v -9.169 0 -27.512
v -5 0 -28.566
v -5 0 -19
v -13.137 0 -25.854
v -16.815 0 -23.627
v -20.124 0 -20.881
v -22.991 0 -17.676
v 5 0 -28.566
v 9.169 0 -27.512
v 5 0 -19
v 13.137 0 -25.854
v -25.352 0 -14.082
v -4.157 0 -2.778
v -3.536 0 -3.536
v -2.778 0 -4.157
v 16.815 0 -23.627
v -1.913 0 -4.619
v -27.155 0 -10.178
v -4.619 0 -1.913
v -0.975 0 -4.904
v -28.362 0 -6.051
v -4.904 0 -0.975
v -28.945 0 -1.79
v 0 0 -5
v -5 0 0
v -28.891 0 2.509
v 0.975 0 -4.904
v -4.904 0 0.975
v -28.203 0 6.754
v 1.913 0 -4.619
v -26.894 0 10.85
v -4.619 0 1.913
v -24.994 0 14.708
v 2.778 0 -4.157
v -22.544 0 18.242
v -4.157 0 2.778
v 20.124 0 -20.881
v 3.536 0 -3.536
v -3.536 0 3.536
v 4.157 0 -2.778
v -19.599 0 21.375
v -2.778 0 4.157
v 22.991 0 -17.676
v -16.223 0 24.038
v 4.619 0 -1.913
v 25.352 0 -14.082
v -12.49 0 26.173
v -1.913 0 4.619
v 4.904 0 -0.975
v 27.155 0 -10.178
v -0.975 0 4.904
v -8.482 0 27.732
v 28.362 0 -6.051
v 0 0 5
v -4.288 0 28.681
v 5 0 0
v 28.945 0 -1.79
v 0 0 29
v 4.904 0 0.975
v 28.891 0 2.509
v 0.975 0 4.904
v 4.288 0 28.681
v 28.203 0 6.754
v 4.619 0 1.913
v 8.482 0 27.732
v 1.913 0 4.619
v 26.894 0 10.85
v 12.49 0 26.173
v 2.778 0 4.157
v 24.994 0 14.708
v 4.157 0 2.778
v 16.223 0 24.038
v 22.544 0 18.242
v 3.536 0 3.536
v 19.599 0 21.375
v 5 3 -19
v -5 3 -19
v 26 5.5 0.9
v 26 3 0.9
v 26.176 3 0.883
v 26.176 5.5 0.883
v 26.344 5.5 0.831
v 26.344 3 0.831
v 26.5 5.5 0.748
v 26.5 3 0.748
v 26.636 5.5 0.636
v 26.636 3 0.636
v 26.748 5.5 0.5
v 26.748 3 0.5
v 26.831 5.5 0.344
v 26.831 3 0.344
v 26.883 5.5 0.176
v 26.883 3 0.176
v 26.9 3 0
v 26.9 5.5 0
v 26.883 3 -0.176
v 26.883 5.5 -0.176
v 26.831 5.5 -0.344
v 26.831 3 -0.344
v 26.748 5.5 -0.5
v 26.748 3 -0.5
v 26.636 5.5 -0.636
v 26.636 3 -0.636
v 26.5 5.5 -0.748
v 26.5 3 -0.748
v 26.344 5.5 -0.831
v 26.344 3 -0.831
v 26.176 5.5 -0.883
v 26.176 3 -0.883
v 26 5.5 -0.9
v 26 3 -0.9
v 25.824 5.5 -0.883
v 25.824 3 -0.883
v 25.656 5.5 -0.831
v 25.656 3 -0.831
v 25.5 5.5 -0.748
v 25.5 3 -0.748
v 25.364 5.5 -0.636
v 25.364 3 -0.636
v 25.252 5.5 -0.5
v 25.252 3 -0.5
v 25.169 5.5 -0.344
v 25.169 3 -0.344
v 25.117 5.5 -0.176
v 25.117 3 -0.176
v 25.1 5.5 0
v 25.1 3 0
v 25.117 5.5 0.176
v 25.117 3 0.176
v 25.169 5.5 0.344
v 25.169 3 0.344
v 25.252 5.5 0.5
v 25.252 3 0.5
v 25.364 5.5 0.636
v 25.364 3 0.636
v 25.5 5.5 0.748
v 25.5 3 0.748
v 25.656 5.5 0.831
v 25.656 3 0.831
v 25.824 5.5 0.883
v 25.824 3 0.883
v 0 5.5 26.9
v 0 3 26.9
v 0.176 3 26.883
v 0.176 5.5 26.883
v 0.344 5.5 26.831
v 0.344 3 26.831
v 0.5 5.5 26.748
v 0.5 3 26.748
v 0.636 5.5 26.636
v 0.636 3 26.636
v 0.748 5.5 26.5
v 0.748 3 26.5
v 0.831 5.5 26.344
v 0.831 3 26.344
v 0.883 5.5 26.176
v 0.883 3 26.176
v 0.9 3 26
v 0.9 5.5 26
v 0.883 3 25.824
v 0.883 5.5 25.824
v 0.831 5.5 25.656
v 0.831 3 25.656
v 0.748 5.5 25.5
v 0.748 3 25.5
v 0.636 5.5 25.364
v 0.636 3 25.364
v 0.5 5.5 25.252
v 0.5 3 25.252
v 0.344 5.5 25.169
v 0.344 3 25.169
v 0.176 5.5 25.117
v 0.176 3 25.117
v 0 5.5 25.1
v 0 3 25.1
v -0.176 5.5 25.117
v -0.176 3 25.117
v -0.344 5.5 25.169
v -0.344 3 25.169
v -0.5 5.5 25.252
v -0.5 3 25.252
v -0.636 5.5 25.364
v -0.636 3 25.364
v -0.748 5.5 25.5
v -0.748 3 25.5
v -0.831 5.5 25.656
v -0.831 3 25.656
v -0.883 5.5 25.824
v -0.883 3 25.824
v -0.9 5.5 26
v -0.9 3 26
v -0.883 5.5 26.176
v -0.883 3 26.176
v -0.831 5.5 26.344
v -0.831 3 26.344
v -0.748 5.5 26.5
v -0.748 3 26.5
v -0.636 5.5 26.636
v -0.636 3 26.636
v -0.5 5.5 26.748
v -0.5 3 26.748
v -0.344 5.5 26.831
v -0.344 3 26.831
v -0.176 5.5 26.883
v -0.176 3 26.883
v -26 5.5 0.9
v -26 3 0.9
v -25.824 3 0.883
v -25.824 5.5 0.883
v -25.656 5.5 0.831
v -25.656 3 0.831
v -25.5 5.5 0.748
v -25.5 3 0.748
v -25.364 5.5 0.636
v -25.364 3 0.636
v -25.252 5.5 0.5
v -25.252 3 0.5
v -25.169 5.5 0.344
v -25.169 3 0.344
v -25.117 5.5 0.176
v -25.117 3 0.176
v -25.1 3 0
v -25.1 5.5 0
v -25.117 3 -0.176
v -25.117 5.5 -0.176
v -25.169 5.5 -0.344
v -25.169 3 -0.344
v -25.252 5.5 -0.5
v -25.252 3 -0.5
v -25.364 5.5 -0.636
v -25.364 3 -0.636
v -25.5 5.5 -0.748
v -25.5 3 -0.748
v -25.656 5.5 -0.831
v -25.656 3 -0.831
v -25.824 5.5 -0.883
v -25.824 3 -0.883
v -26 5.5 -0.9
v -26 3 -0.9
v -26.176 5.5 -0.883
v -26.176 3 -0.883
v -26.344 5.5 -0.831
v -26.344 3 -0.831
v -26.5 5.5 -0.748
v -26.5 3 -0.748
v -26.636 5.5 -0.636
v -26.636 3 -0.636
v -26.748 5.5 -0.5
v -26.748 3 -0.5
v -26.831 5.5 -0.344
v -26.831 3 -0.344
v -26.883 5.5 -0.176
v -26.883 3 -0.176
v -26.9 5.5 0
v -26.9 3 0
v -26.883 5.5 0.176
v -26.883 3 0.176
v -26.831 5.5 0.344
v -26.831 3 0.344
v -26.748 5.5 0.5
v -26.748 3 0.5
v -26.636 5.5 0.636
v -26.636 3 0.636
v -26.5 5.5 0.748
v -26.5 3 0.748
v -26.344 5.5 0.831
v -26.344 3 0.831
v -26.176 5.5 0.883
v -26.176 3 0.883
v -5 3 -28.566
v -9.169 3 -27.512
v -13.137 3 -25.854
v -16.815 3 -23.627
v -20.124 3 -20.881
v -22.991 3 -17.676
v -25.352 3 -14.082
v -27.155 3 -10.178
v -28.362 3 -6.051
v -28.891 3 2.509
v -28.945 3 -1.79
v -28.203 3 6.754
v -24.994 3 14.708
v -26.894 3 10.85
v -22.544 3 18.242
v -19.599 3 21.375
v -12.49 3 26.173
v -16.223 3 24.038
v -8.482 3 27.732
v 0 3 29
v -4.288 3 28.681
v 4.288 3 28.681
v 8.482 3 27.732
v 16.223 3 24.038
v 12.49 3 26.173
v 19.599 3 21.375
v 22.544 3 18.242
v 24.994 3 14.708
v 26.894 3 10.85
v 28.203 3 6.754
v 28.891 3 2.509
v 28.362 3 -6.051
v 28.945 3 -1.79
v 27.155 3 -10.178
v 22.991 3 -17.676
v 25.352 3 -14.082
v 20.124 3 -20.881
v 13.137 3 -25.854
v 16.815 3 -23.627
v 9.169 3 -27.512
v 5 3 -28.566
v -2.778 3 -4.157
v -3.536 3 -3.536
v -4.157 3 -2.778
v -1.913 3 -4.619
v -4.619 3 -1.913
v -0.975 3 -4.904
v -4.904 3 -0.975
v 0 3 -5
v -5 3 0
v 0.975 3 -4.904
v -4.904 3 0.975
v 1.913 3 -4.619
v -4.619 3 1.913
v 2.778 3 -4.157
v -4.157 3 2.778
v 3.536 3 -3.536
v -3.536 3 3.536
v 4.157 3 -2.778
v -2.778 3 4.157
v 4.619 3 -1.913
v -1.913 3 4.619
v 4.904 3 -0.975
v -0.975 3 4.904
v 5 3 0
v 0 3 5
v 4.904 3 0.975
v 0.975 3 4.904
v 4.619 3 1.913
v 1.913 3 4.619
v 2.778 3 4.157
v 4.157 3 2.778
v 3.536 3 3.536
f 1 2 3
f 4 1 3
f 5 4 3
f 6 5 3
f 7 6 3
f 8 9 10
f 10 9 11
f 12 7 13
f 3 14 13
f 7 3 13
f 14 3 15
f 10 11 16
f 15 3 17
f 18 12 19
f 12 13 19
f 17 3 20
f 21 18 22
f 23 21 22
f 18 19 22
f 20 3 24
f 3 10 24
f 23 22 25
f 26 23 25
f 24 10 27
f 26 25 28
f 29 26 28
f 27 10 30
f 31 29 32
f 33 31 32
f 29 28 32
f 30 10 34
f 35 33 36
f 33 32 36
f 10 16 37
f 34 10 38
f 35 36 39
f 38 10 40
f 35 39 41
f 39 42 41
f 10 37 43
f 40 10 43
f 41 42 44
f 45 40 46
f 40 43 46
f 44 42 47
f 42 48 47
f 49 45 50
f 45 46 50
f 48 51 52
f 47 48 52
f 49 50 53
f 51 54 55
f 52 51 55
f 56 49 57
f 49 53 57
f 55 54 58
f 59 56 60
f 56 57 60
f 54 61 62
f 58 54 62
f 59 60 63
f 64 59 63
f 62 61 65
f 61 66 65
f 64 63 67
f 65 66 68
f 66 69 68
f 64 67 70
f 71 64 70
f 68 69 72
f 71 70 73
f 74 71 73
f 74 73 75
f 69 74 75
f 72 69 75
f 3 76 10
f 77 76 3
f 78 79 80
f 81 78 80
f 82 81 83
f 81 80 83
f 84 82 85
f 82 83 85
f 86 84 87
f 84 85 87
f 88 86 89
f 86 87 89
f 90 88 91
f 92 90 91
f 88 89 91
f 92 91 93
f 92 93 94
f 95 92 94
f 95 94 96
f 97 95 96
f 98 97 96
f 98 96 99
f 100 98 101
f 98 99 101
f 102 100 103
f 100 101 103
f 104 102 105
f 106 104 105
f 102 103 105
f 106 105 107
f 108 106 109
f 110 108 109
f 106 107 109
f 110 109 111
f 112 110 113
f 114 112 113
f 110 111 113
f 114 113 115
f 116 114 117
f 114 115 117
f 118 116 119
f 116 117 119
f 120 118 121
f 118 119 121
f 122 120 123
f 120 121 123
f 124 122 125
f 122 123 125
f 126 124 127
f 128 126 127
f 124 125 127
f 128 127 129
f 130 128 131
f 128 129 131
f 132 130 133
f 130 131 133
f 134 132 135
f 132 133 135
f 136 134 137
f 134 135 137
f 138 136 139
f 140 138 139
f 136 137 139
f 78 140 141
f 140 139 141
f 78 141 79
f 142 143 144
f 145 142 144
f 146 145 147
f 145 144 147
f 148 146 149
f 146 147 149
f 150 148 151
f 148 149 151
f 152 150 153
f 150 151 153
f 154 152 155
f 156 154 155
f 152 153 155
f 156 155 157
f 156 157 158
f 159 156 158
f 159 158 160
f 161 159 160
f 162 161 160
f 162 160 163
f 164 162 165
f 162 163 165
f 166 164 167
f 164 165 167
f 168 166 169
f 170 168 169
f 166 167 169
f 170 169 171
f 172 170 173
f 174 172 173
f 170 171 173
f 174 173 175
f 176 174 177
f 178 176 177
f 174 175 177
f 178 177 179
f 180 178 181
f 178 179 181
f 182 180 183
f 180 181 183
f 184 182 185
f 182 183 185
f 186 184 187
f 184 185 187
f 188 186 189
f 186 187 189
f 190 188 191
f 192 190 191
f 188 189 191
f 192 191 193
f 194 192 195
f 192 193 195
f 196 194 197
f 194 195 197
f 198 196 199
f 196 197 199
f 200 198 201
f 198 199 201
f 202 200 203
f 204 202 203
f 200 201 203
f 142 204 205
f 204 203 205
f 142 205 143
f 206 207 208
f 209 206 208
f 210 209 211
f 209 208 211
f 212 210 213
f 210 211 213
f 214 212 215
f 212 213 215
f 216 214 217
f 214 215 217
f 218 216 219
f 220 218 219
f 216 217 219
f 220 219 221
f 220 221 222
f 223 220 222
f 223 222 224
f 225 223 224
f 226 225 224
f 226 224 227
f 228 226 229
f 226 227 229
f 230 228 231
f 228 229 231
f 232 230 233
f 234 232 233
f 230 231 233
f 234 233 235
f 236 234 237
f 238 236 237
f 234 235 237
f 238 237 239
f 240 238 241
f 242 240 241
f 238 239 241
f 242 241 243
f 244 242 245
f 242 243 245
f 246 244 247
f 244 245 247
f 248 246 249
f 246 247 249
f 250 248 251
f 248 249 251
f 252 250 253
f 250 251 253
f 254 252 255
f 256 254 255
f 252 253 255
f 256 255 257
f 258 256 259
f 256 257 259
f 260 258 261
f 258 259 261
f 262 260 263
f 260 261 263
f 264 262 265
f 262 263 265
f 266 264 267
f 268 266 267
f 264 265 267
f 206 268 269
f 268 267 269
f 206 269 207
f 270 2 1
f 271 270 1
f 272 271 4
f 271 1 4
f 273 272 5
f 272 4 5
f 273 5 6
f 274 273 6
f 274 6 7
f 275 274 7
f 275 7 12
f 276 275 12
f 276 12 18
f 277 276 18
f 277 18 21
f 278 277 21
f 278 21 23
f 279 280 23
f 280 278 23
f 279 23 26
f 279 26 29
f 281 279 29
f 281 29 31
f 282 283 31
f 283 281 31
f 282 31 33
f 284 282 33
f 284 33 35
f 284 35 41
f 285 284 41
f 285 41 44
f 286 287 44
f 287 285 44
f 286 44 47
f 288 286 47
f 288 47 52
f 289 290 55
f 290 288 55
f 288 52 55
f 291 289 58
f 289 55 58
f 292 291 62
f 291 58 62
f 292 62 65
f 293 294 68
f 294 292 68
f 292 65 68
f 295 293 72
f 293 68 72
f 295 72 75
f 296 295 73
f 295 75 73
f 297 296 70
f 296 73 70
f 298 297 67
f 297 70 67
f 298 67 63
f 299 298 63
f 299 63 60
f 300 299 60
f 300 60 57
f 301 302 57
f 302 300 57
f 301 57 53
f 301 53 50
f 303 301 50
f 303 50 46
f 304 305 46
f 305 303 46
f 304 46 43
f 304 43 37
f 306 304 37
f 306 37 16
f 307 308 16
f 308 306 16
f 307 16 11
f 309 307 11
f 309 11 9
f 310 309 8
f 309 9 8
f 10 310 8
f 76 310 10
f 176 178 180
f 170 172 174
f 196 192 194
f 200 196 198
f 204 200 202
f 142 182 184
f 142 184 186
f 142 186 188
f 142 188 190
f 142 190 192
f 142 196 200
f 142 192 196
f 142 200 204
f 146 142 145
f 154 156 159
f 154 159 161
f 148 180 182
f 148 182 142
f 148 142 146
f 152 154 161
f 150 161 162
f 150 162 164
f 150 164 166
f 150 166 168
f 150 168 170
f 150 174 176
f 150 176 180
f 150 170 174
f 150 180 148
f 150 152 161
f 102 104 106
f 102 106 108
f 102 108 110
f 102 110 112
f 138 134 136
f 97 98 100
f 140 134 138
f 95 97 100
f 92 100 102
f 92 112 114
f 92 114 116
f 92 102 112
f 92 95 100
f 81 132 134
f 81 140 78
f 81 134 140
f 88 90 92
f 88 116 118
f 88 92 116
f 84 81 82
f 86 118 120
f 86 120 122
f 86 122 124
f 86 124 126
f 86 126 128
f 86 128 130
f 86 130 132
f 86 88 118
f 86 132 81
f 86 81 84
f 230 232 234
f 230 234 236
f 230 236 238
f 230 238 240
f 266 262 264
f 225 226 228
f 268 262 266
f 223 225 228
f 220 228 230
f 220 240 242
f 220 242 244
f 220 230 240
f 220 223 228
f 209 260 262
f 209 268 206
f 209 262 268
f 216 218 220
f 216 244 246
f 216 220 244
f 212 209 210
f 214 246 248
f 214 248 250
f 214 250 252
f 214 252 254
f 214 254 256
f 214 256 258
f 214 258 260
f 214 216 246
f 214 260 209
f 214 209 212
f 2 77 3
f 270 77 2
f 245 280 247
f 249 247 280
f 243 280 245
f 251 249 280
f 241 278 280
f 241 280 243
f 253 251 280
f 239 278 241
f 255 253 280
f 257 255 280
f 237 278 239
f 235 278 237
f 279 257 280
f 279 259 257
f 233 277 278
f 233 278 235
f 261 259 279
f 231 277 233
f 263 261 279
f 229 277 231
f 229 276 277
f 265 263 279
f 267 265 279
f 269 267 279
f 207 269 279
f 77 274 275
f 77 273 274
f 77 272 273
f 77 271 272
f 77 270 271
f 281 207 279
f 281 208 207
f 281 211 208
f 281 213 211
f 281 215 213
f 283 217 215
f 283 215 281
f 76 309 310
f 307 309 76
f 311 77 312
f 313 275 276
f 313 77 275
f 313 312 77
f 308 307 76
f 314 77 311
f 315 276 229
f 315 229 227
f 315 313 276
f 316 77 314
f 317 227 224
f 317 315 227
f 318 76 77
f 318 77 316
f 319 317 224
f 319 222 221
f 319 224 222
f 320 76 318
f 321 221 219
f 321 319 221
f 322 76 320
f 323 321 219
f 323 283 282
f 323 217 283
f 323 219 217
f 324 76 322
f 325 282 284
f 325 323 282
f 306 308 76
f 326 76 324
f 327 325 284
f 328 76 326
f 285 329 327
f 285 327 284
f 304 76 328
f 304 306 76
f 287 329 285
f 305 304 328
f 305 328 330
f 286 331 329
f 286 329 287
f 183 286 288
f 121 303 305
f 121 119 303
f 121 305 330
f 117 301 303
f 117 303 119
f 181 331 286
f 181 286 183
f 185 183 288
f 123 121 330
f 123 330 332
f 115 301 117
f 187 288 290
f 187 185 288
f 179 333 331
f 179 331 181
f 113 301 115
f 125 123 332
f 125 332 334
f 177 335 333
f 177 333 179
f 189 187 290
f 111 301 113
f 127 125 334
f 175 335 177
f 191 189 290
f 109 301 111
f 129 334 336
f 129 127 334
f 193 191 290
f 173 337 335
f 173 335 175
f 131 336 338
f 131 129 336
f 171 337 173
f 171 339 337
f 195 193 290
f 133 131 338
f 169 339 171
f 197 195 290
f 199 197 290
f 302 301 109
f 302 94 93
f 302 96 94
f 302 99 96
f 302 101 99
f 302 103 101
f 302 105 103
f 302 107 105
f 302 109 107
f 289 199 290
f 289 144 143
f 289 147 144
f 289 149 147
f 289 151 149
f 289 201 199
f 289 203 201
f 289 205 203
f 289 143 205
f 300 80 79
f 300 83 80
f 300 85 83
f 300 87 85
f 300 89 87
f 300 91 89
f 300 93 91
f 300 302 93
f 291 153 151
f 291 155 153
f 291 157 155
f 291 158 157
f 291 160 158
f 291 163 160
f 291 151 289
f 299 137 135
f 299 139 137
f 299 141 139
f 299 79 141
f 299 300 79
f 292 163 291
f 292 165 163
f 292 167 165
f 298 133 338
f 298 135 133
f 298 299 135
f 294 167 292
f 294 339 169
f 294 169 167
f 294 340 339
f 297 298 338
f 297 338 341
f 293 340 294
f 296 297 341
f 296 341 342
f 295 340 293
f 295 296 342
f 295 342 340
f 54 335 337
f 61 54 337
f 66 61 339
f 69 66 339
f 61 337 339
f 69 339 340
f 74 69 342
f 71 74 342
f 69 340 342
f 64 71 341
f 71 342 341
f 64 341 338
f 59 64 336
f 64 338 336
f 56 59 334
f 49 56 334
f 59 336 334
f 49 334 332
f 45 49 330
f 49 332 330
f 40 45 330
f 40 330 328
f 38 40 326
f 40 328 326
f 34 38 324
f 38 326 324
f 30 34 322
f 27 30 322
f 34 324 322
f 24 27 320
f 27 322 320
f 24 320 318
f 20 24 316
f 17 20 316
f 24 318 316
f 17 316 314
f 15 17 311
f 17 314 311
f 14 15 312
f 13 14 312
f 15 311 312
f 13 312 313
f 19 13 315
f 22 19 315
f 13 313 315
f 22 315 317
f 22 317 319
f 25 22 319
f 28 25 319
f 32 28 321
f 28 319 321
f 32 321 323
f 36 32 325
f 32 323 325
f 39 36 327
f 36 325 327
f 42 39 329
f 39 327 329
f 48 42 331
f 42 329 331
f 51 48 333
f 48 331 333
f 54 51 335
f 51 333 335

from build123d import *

# Parameters (mm, degrees)
SKETCH1_R           = 29
BOSS_EXTRUDE1_DEPTH = 3
SKETCH6_R           = 0.9
BOSS_EXTRUDE3_DEPTH = 2.5
SKETCH7_R           = 0.9
BOSS_EXTRUDE4_DEPTH = 2.5
SKETCH8_R           = 5
CUT_EXTRUDE2_DEPTH  = 3
CUT_EXTRUDE3_DEPTH  = 10


with BuildPart() as part:
    # Sketch1 → Boss-Extrude1 (new body)
    with BuildSketch(Plane(origin=(0, 0, 0), x_dir=(1, 0, 0), z_dir=(0, 1, 0))):
        with Locations(Location((0, 0, 0), (0, 0, 270))):
            Circle(SKETCH1_R)
    extrude(amount=BOSS_EXTRUDE1_DEPTH)

    # Sketch6 → Boss-Extrude3 (add)
    with BuildSketch(Plane(origin=(0, 3, 0), x_dir=(1, 0, 0), z_dir=(0, 1, 0))):
        with Locations(Location((-26, 0, 0), (0, 0, 270))):
            Circle(SKETCH6_R)
        with Locations(Location((26, 0, 0), (0, 0, 270))):
            Circle(SKETCH6_R)
    extrude(amount=BOSS_EXTRUDE3_DEPTH)

    # Sketch7 → Boss-Extrude4 (add)
    with BuildSketch(Plane(origin=(0, 3, 0), x_dir=(1, 0, 0), z_dir=(0, 1, 0))):
        with Locations(Location((0, -26, 0), (0, 0, 270))):
            Circle(SKETCH7_R)
    extrude(amount=BOSS_EXTRUDE4_DEPTH)

    # Sketch8 → Cut-Extrude2 (cut)
    with BuildSketch(Plane(origin=(0, 3, 0), x_dir=(1, 0, 0), z_dir=(0, 1, 0))):
        with Locations(Location((0, 0, 0), (0, 0, 270))):
            Circle(SKETCH8_R)
    extrude(amount=-CUT_EXTRUDE2_DEPTH, mode=Mode.SUBTRACT)

    # Sketch9 → Cut-Extrude3 (cut)
    with BuildSketch(Plane(origin=(0, 3, 0), x_dir=(1, 0, 0), z_dir=(0, 1, 0))):
        Polygon((0, 29), (5, 29), (5, 19), (-5, 19), (-5, 29), align=None)
    extrude(amount=-CUT_EXTRUDE3_DEPTH, mode=Mode.SUBTRACT)


solid = part.part
